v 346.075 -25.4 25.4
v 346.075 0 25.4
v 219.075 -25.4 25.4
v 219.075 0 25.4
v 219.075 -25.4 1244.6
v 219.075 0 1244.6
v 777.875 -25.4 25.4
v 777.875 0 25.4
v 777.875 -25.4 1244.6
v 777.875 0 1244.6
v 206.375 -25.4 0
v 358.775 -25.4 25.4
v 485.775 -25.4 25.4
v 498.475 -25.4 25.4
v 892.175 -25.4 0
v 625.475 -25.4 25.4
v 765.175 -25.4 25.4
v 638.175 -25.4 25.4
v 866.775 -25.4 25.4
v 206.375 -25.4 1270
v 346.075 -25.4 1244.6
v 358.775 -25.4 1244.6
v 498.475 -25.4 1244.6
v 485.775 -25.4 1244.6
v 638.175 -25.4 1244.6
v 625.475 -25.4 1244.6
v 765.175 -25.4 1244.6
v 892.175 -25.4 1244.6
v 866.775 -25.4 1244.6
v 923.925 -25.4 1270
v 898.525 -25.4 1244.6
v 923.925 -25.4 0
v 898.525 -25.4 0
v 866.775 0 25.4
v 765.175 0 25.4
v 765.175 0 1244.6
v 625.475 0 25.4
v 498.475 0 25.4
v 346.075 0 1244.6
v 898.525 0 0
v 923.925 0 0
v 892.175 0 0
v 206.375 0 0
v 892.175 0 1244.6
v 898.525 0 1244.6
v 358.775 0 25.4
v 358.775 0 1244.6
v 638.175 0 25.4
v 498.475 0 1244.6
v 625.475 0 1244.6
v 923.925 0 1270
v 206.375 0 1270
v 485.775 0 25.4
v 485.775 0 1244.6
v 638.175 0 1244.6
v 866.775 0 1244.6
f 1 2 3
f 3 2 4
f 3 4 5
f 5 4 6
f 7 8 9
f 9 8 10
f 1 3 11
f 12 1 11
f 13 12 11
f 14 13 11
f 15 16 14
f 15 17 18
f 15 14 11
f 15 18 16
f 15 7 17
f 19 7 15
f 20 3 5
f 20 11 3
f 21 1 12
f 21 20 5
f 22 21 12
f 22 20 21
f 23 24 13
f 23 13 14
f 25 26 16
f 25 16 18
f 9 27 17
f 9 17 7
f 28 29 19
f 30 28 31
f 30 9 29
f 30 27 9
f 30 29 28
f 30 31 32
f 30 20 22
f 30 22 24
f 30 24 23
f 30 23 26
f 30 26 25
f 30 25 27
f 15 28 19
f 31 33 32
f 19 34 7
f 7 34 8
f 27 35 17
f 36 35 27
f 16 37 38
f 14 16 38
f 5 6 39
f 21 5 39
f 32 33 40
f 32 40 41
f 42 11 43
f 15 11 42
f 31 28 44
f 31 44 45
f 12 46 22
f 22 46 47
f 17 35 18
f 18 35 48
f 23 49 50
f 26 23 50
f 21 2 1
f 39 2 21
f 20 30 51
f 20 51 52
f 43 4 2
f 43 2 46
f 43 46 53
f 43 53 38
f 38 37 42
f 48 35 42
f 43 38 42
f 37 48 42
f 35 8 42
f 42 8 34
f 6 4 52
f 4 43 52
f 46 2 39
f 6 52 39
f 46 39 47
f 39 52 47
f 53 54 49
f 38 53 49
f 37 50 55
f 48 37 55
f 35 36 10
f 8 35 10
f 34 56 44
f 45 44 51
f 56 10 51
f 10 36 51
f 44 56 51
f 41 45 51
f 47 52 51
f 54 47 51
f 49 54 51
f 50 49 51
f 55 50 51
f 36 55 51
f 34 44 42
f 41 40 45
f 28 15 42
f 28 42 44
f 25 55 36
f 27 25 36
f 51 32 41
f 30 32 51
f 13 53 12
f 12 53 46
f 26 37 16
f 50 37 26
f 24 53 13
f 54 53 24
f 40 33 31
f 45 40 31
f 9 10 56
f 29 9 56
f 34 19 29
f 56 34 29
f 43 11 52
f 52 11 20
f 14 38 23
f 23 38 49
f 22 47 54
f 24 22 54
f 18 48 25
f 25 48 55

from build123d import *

# Parameters (mm, degrees)
F0_W      = 12.7
F0_H      = 1219.2
F1_DEPTH  = 25.4
F2_W      = 406.4
F2_H      = 1396.9661742449
F2_W_2    = 69.85
F2_H_2    = 1270
F2_W_3    = 63.5
F3_DEPTH  = 25.4
F4_W      = 25.4
F4_H      = 1270
F5_DEPTH  = 25.4
F6_W      = 25.4
F6_H      = 1270
F7_DEPTH  = 25.4
F6_H_2    = 25.4
F6_W_2    = 31.75
F6_H_3    = 1244.6
F9_W      = 975.7457971573
F9_H      = 1423.7642139196
F10_DEPTH = 218.67692


with BuildPart() as f1:
    # F0 (on Front) → F1 (new body)
    with BuildSketch(Plane.XZ):
        Polygon((-930.275, 1270), (-930.275, 1244.6), (-771.525, 1244.6), (-758.825, 1244.6), (-631.825, 1244.6), (-619.125, 1244.6), (-492.125, 1244.6), (-479.425, 1244.6), (-352.425, 1244.6), (-339.725, 1244.6), (-212.725, 1244.6), (-200.025, 1244.6), (-73.025, 1244.6), (-60.325, 1244.6), (66.675, 1244.6), (79.375, 1244.6), (206.375, 1244.6), (219.075, 1244.6), (346.075, 1244.6), (358.775, 1244.6), (485.775, 1244.6), (498.475, 1244.6), (625.475, 1244.6), (638.175, 1244.6), (765.175, 1244.6), (777.875, 1244.6), (930.275, 1244.6), (930.275, 1270), align=None)
        with Locations((-765.175, 635)):
            Rectangle(F0_W, F0_H)
        Polygon((-758.825, 25.4), (-771.525, 25.4), (-930.275, 25.4), (-930.275, 0), (930.275, 0), (930.275, 25.4), (777.875, 25.4), (765.175, 25.4), (638.175, 25.4), (625.475, 25.4), (498.475, 25.4), (485.775, 25.4), (358.775, 25.4), (346.075, 25.4), (219.075, 25.4), (206.375, 25.4), (79.375, 25.4), (66.675, 25.4), (-60.325, 25.4), (-73.025, 25.4), (-200.025, 25.4), (-212.725, 25.4), (-339.725, 25.4), (-352.425, 25.4), (-479.425, 25.4), (-492.125, 25.4), (-619.125, 25.4), (-631.825, 25.4), align=None)
        with Locations((771.525, 635)):
            Rectangle(F0_W, F0_H)
        with Locations((-625.475, 635)):
            Rectangle(F0_W, F0_H)
        with Locations((-485.775, 635)):
            Rectangle(F0_W, F0_H)
        with Locations((-346.075, 635)):
            Rectangle(F0_W, F0_H)
        with Locations((-206.375, 635)):
            Rectangle(F0_W, F0_H)
        with Locations((-66.675, 635)):
            Rectangle(F0_W, F0_H)
        with Locations((73.025, 635)):
            Rectangle(F0_W, F0_H)
        with Locations((212.725, 635)):
            Rectangle(F0_W, F0_H)
        with Locations((352.425, 635)):
            Rectangle(F0_W, F0_H)
        with Locations((492.125, 635)):
            Rectangle(F0_W, F0_H)
        with Locations((631.825, 635)):
            Rectangle(F0_W, F0_H)
    extrude(amount=F1_DEPTH)

    # F2 (on face) → F3 (cut)
    with BuildSketch(Plane.XZ.offset(25.4)):
        with Locations((3.175, 593.5398563743)):
            Rectangle(F2_W, F2_H)
        with Locations((-895.35, 635)):
            Rectangle(F2_W_2, F2_H_2)
        with Locations((898.525, 635)):
            Rectangle(F2_W_3, F2_H_2)
    extrude(amount=-F3_DEPTH, mode=Mode.SUBTRACT)

    # F4 (on face) → F5, piece 2 (join)
    with BuildSketch(Plane.XZ.offset(25.4)):
        with Locations((879.475, 635)):
            Rectangle(F4_W, F4_H)
    extrude(amount=-F5_DEPTH)

    # F6 (on face) → F7, piece 2 (join)
    with BuildSketch(Plane.XZ.offset(25.4)):
        with Locations((911.225, 1257.3)):
            Rectangle(F6_W, F6_H_2)
        with Locations((882.65, 1257.3)):
            Rectangle(F6_W_2, F6_H_2)
        with Locations((911.225, 622.3)):
            Rectangle(F6_W, F6_H_3)
    extrude(amount=-F7_DEPTH)

    # F8: union 


with BuildPart() as f5:
    # F4 (on face) → F5 (new body)
    with BuildSketch(Plane.XZ.offset(25.4)):
        with Locations((-873.125, 635)):
            Rectangle(F4_W, F4_H)
    extrude(amount=-F5_DEPTH)


with BuildPart() as f7:
    # F6 (on face) → F7 (new body)
    with BuildSketch(Plane.XZ.offset(25.4)):
        with Locations((-904.875, 635)):
            Rectangle(F6_W, F6_H)
    extrude(amount=-F7_DEPTH)


with BuildPart() as f10_tool:
    # F9 (on face) → F10 (new body)
    with BuildSketch(Plane(origin=(0, 0, 0), x_dir=(-1, 0, 0), z_dir=(0, 1, 0))):
        with Locations((666.6726469994, 601.2135818601)):
            Rectangle(F9_W, F9_H)
    extrude(amount=-F10_DEPTH)


with BuildPart() as f1_1:
    add(f1.part)

    # F10: cut by f10_tool
    add(f10_tool.part, mode=Mode.SUBTRACT)


with BuildPart() as f5_1:
    add(f5.part)

    # F10: cut by f10_tool
    add(f10_tool.part, mode=Mode.SUBTRACT)


with BuildPart() as f7_1:
    add(f7.part)

    # F10: cut by f10_tool
    add(f10_tool.part, mode=Mode.SUBTRACT)


solid = f1_1.part
